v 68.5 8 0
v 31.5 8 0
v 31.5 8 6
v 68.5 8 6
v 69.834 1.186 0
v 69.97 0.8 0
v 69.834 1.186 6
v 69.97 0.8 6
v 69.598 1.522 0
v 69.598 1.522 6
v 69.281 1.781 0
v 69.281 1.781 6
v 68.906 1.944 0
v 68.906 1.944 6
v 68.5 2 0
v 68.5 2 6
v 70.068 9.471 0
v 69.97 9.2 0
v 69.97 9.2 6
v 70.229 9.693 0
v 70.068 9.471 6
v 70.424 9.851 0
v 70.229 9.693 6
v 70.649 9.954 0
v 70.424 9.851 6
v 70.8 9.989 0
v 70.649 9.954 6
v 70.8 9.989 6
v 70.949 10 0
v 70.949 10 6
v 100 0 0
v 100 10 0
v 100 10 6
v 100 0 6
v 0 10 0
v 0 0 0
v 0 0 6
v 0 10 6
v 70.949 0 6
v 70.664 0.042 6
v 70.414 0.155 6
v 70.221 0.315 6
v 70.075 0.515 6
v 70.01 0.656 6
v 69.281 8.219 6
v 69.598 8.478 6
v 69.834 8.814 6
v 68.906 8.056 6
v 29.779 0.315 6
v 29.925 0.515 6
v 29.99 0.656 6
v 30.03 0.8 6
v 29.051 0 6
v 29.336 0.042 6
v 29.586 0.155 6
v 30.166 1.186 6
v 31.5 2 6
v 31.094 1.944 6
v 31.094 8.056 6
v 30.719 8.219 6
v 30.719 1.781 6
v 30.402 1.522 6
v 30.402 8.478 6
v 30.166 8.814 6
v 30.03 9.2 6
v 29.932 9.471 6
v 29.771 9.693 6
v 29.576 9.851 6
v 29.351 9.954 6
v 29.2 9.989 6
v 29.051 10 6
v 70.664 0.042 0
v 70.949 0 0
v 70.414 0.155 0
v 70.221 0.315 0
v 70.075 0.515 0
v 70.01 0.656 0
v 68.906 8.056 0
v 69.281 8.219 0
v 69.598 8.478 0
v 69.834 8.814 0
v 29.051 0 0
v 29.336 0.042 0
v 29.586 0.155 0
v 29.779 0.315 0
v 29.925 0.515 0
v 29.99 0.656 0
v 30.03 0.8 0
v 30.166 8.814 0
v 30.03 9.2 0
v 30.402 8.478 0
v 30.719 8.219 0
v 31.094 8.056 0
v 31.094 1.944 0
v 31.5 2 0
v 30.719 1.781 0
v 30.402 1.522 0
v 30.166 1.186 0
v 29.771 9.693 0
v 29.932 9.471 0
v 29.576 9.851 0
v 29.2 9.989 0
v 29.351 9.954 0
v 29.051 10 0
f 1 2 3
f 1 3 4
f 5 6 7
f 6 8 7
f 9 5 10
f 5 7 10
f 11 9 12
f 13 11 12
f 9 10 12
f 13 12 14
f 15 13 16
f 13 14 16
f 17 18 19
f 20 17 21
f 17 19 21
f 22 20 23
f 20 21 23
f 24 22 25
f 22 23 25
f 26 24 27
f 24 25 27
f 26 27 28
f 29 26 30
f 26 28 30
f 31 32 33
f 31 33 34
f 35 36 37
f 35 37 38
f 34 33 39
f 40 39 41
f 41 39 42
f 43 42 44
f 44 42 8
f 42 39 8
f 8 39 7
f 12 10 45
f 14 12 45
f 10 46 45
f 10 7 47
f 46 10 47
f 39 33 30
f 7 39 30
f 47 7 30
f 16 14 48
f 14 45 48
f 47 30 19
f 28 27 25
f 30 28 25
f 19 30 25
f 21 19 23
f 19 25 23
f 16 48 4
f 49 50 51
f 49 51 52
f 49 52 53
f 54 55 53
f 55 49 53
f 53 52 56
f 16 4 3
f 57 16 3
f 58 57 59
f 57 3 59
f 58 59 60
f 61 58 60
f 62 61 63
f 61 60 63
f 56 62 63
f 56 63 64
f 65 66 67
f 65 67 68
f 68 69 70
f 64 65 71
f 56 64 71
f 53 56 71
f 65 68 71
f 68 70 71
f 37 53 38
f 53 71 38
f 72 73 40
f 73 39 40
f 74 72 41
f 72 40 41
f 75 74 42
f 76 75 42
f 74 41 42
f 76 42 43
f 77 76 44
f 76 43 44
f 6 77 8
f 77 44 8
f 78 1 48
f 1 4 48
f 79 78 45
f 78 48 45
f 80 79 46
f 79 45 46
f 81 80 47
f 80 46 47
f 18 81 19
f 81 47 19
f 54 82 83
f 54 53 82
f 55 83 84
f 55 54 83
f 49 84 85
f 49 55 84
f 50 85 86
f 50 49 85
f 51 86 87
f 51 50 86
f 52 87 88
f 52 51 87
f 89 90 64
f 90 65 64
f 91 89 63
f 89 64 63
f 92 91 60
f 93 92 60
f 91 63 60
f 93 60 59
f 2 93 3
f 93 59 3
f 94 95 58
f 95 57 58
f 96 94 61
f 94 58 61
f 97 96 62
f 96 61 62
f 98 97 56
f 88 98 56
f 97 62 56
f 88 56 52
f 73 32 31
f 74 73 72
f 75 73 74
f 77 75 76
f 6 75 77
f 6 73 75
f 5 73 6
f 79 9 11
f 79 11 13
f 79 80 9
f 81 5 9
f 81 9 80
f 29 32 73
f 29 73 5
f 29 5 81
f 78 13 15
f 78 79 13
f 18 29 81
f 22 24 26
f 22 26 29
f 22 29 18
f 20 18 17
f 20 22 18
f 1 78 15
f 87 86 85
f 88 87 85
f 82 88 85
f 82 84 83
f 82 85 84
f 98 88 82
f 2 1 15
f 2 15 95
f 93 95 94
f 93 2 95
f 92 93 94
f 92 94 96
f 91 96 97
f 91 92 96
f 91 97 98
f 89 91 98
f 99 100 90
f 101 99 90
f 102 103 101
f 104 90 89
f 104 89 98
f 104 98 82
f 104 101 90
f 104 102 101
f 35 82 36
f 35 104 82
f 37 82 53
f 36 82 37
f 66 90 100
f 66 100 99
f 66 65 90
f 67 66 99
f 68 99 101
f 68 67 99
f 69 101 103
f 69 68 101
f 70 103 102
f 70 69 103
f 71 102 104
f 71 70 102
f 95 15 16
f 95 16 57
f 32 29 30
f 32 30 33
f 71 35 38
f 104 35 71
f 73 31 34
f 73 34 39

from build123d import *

# Parameters (mm, degrees)
PAD_DEPTH   = 6
FILLET_R    = 1.5
FILLET001_R = 1


with BuildPart() as part:
    # Sketch → Pad (new body)
    with BuildSketch(Plane.XY):
        Polygon((0, 0), (0, 10), (30, 10), (30, 8), (70, 8), (70, 10), (100, 10), (100, 0), (70, 0), (70, 2), (30, 2), (30, 0), align=None)
    extrude(amount=PAD_DEPTH)

    # Fillet
    fillet_edges = [part.edges().sort_by_distance(p)[0] for p in [
        (70, 8, 3),
        (70, 2, 3),
        (30, 2, 3),
        (30, 8, 3),
    ]]
    fillet(fillet_edges, radius=FILLET_R)

    # Fillet001
    fillet001_edges = [part.edges().sort_by_distance(p)[0] for p in [
        (30, 10, 3),
        (30, 0, 3),
        (70, 0, 3),
        (70, 10, 3),
    ]]
    fillet(fillet001_edges, radius=FILLET001_R)


solid = part.part
